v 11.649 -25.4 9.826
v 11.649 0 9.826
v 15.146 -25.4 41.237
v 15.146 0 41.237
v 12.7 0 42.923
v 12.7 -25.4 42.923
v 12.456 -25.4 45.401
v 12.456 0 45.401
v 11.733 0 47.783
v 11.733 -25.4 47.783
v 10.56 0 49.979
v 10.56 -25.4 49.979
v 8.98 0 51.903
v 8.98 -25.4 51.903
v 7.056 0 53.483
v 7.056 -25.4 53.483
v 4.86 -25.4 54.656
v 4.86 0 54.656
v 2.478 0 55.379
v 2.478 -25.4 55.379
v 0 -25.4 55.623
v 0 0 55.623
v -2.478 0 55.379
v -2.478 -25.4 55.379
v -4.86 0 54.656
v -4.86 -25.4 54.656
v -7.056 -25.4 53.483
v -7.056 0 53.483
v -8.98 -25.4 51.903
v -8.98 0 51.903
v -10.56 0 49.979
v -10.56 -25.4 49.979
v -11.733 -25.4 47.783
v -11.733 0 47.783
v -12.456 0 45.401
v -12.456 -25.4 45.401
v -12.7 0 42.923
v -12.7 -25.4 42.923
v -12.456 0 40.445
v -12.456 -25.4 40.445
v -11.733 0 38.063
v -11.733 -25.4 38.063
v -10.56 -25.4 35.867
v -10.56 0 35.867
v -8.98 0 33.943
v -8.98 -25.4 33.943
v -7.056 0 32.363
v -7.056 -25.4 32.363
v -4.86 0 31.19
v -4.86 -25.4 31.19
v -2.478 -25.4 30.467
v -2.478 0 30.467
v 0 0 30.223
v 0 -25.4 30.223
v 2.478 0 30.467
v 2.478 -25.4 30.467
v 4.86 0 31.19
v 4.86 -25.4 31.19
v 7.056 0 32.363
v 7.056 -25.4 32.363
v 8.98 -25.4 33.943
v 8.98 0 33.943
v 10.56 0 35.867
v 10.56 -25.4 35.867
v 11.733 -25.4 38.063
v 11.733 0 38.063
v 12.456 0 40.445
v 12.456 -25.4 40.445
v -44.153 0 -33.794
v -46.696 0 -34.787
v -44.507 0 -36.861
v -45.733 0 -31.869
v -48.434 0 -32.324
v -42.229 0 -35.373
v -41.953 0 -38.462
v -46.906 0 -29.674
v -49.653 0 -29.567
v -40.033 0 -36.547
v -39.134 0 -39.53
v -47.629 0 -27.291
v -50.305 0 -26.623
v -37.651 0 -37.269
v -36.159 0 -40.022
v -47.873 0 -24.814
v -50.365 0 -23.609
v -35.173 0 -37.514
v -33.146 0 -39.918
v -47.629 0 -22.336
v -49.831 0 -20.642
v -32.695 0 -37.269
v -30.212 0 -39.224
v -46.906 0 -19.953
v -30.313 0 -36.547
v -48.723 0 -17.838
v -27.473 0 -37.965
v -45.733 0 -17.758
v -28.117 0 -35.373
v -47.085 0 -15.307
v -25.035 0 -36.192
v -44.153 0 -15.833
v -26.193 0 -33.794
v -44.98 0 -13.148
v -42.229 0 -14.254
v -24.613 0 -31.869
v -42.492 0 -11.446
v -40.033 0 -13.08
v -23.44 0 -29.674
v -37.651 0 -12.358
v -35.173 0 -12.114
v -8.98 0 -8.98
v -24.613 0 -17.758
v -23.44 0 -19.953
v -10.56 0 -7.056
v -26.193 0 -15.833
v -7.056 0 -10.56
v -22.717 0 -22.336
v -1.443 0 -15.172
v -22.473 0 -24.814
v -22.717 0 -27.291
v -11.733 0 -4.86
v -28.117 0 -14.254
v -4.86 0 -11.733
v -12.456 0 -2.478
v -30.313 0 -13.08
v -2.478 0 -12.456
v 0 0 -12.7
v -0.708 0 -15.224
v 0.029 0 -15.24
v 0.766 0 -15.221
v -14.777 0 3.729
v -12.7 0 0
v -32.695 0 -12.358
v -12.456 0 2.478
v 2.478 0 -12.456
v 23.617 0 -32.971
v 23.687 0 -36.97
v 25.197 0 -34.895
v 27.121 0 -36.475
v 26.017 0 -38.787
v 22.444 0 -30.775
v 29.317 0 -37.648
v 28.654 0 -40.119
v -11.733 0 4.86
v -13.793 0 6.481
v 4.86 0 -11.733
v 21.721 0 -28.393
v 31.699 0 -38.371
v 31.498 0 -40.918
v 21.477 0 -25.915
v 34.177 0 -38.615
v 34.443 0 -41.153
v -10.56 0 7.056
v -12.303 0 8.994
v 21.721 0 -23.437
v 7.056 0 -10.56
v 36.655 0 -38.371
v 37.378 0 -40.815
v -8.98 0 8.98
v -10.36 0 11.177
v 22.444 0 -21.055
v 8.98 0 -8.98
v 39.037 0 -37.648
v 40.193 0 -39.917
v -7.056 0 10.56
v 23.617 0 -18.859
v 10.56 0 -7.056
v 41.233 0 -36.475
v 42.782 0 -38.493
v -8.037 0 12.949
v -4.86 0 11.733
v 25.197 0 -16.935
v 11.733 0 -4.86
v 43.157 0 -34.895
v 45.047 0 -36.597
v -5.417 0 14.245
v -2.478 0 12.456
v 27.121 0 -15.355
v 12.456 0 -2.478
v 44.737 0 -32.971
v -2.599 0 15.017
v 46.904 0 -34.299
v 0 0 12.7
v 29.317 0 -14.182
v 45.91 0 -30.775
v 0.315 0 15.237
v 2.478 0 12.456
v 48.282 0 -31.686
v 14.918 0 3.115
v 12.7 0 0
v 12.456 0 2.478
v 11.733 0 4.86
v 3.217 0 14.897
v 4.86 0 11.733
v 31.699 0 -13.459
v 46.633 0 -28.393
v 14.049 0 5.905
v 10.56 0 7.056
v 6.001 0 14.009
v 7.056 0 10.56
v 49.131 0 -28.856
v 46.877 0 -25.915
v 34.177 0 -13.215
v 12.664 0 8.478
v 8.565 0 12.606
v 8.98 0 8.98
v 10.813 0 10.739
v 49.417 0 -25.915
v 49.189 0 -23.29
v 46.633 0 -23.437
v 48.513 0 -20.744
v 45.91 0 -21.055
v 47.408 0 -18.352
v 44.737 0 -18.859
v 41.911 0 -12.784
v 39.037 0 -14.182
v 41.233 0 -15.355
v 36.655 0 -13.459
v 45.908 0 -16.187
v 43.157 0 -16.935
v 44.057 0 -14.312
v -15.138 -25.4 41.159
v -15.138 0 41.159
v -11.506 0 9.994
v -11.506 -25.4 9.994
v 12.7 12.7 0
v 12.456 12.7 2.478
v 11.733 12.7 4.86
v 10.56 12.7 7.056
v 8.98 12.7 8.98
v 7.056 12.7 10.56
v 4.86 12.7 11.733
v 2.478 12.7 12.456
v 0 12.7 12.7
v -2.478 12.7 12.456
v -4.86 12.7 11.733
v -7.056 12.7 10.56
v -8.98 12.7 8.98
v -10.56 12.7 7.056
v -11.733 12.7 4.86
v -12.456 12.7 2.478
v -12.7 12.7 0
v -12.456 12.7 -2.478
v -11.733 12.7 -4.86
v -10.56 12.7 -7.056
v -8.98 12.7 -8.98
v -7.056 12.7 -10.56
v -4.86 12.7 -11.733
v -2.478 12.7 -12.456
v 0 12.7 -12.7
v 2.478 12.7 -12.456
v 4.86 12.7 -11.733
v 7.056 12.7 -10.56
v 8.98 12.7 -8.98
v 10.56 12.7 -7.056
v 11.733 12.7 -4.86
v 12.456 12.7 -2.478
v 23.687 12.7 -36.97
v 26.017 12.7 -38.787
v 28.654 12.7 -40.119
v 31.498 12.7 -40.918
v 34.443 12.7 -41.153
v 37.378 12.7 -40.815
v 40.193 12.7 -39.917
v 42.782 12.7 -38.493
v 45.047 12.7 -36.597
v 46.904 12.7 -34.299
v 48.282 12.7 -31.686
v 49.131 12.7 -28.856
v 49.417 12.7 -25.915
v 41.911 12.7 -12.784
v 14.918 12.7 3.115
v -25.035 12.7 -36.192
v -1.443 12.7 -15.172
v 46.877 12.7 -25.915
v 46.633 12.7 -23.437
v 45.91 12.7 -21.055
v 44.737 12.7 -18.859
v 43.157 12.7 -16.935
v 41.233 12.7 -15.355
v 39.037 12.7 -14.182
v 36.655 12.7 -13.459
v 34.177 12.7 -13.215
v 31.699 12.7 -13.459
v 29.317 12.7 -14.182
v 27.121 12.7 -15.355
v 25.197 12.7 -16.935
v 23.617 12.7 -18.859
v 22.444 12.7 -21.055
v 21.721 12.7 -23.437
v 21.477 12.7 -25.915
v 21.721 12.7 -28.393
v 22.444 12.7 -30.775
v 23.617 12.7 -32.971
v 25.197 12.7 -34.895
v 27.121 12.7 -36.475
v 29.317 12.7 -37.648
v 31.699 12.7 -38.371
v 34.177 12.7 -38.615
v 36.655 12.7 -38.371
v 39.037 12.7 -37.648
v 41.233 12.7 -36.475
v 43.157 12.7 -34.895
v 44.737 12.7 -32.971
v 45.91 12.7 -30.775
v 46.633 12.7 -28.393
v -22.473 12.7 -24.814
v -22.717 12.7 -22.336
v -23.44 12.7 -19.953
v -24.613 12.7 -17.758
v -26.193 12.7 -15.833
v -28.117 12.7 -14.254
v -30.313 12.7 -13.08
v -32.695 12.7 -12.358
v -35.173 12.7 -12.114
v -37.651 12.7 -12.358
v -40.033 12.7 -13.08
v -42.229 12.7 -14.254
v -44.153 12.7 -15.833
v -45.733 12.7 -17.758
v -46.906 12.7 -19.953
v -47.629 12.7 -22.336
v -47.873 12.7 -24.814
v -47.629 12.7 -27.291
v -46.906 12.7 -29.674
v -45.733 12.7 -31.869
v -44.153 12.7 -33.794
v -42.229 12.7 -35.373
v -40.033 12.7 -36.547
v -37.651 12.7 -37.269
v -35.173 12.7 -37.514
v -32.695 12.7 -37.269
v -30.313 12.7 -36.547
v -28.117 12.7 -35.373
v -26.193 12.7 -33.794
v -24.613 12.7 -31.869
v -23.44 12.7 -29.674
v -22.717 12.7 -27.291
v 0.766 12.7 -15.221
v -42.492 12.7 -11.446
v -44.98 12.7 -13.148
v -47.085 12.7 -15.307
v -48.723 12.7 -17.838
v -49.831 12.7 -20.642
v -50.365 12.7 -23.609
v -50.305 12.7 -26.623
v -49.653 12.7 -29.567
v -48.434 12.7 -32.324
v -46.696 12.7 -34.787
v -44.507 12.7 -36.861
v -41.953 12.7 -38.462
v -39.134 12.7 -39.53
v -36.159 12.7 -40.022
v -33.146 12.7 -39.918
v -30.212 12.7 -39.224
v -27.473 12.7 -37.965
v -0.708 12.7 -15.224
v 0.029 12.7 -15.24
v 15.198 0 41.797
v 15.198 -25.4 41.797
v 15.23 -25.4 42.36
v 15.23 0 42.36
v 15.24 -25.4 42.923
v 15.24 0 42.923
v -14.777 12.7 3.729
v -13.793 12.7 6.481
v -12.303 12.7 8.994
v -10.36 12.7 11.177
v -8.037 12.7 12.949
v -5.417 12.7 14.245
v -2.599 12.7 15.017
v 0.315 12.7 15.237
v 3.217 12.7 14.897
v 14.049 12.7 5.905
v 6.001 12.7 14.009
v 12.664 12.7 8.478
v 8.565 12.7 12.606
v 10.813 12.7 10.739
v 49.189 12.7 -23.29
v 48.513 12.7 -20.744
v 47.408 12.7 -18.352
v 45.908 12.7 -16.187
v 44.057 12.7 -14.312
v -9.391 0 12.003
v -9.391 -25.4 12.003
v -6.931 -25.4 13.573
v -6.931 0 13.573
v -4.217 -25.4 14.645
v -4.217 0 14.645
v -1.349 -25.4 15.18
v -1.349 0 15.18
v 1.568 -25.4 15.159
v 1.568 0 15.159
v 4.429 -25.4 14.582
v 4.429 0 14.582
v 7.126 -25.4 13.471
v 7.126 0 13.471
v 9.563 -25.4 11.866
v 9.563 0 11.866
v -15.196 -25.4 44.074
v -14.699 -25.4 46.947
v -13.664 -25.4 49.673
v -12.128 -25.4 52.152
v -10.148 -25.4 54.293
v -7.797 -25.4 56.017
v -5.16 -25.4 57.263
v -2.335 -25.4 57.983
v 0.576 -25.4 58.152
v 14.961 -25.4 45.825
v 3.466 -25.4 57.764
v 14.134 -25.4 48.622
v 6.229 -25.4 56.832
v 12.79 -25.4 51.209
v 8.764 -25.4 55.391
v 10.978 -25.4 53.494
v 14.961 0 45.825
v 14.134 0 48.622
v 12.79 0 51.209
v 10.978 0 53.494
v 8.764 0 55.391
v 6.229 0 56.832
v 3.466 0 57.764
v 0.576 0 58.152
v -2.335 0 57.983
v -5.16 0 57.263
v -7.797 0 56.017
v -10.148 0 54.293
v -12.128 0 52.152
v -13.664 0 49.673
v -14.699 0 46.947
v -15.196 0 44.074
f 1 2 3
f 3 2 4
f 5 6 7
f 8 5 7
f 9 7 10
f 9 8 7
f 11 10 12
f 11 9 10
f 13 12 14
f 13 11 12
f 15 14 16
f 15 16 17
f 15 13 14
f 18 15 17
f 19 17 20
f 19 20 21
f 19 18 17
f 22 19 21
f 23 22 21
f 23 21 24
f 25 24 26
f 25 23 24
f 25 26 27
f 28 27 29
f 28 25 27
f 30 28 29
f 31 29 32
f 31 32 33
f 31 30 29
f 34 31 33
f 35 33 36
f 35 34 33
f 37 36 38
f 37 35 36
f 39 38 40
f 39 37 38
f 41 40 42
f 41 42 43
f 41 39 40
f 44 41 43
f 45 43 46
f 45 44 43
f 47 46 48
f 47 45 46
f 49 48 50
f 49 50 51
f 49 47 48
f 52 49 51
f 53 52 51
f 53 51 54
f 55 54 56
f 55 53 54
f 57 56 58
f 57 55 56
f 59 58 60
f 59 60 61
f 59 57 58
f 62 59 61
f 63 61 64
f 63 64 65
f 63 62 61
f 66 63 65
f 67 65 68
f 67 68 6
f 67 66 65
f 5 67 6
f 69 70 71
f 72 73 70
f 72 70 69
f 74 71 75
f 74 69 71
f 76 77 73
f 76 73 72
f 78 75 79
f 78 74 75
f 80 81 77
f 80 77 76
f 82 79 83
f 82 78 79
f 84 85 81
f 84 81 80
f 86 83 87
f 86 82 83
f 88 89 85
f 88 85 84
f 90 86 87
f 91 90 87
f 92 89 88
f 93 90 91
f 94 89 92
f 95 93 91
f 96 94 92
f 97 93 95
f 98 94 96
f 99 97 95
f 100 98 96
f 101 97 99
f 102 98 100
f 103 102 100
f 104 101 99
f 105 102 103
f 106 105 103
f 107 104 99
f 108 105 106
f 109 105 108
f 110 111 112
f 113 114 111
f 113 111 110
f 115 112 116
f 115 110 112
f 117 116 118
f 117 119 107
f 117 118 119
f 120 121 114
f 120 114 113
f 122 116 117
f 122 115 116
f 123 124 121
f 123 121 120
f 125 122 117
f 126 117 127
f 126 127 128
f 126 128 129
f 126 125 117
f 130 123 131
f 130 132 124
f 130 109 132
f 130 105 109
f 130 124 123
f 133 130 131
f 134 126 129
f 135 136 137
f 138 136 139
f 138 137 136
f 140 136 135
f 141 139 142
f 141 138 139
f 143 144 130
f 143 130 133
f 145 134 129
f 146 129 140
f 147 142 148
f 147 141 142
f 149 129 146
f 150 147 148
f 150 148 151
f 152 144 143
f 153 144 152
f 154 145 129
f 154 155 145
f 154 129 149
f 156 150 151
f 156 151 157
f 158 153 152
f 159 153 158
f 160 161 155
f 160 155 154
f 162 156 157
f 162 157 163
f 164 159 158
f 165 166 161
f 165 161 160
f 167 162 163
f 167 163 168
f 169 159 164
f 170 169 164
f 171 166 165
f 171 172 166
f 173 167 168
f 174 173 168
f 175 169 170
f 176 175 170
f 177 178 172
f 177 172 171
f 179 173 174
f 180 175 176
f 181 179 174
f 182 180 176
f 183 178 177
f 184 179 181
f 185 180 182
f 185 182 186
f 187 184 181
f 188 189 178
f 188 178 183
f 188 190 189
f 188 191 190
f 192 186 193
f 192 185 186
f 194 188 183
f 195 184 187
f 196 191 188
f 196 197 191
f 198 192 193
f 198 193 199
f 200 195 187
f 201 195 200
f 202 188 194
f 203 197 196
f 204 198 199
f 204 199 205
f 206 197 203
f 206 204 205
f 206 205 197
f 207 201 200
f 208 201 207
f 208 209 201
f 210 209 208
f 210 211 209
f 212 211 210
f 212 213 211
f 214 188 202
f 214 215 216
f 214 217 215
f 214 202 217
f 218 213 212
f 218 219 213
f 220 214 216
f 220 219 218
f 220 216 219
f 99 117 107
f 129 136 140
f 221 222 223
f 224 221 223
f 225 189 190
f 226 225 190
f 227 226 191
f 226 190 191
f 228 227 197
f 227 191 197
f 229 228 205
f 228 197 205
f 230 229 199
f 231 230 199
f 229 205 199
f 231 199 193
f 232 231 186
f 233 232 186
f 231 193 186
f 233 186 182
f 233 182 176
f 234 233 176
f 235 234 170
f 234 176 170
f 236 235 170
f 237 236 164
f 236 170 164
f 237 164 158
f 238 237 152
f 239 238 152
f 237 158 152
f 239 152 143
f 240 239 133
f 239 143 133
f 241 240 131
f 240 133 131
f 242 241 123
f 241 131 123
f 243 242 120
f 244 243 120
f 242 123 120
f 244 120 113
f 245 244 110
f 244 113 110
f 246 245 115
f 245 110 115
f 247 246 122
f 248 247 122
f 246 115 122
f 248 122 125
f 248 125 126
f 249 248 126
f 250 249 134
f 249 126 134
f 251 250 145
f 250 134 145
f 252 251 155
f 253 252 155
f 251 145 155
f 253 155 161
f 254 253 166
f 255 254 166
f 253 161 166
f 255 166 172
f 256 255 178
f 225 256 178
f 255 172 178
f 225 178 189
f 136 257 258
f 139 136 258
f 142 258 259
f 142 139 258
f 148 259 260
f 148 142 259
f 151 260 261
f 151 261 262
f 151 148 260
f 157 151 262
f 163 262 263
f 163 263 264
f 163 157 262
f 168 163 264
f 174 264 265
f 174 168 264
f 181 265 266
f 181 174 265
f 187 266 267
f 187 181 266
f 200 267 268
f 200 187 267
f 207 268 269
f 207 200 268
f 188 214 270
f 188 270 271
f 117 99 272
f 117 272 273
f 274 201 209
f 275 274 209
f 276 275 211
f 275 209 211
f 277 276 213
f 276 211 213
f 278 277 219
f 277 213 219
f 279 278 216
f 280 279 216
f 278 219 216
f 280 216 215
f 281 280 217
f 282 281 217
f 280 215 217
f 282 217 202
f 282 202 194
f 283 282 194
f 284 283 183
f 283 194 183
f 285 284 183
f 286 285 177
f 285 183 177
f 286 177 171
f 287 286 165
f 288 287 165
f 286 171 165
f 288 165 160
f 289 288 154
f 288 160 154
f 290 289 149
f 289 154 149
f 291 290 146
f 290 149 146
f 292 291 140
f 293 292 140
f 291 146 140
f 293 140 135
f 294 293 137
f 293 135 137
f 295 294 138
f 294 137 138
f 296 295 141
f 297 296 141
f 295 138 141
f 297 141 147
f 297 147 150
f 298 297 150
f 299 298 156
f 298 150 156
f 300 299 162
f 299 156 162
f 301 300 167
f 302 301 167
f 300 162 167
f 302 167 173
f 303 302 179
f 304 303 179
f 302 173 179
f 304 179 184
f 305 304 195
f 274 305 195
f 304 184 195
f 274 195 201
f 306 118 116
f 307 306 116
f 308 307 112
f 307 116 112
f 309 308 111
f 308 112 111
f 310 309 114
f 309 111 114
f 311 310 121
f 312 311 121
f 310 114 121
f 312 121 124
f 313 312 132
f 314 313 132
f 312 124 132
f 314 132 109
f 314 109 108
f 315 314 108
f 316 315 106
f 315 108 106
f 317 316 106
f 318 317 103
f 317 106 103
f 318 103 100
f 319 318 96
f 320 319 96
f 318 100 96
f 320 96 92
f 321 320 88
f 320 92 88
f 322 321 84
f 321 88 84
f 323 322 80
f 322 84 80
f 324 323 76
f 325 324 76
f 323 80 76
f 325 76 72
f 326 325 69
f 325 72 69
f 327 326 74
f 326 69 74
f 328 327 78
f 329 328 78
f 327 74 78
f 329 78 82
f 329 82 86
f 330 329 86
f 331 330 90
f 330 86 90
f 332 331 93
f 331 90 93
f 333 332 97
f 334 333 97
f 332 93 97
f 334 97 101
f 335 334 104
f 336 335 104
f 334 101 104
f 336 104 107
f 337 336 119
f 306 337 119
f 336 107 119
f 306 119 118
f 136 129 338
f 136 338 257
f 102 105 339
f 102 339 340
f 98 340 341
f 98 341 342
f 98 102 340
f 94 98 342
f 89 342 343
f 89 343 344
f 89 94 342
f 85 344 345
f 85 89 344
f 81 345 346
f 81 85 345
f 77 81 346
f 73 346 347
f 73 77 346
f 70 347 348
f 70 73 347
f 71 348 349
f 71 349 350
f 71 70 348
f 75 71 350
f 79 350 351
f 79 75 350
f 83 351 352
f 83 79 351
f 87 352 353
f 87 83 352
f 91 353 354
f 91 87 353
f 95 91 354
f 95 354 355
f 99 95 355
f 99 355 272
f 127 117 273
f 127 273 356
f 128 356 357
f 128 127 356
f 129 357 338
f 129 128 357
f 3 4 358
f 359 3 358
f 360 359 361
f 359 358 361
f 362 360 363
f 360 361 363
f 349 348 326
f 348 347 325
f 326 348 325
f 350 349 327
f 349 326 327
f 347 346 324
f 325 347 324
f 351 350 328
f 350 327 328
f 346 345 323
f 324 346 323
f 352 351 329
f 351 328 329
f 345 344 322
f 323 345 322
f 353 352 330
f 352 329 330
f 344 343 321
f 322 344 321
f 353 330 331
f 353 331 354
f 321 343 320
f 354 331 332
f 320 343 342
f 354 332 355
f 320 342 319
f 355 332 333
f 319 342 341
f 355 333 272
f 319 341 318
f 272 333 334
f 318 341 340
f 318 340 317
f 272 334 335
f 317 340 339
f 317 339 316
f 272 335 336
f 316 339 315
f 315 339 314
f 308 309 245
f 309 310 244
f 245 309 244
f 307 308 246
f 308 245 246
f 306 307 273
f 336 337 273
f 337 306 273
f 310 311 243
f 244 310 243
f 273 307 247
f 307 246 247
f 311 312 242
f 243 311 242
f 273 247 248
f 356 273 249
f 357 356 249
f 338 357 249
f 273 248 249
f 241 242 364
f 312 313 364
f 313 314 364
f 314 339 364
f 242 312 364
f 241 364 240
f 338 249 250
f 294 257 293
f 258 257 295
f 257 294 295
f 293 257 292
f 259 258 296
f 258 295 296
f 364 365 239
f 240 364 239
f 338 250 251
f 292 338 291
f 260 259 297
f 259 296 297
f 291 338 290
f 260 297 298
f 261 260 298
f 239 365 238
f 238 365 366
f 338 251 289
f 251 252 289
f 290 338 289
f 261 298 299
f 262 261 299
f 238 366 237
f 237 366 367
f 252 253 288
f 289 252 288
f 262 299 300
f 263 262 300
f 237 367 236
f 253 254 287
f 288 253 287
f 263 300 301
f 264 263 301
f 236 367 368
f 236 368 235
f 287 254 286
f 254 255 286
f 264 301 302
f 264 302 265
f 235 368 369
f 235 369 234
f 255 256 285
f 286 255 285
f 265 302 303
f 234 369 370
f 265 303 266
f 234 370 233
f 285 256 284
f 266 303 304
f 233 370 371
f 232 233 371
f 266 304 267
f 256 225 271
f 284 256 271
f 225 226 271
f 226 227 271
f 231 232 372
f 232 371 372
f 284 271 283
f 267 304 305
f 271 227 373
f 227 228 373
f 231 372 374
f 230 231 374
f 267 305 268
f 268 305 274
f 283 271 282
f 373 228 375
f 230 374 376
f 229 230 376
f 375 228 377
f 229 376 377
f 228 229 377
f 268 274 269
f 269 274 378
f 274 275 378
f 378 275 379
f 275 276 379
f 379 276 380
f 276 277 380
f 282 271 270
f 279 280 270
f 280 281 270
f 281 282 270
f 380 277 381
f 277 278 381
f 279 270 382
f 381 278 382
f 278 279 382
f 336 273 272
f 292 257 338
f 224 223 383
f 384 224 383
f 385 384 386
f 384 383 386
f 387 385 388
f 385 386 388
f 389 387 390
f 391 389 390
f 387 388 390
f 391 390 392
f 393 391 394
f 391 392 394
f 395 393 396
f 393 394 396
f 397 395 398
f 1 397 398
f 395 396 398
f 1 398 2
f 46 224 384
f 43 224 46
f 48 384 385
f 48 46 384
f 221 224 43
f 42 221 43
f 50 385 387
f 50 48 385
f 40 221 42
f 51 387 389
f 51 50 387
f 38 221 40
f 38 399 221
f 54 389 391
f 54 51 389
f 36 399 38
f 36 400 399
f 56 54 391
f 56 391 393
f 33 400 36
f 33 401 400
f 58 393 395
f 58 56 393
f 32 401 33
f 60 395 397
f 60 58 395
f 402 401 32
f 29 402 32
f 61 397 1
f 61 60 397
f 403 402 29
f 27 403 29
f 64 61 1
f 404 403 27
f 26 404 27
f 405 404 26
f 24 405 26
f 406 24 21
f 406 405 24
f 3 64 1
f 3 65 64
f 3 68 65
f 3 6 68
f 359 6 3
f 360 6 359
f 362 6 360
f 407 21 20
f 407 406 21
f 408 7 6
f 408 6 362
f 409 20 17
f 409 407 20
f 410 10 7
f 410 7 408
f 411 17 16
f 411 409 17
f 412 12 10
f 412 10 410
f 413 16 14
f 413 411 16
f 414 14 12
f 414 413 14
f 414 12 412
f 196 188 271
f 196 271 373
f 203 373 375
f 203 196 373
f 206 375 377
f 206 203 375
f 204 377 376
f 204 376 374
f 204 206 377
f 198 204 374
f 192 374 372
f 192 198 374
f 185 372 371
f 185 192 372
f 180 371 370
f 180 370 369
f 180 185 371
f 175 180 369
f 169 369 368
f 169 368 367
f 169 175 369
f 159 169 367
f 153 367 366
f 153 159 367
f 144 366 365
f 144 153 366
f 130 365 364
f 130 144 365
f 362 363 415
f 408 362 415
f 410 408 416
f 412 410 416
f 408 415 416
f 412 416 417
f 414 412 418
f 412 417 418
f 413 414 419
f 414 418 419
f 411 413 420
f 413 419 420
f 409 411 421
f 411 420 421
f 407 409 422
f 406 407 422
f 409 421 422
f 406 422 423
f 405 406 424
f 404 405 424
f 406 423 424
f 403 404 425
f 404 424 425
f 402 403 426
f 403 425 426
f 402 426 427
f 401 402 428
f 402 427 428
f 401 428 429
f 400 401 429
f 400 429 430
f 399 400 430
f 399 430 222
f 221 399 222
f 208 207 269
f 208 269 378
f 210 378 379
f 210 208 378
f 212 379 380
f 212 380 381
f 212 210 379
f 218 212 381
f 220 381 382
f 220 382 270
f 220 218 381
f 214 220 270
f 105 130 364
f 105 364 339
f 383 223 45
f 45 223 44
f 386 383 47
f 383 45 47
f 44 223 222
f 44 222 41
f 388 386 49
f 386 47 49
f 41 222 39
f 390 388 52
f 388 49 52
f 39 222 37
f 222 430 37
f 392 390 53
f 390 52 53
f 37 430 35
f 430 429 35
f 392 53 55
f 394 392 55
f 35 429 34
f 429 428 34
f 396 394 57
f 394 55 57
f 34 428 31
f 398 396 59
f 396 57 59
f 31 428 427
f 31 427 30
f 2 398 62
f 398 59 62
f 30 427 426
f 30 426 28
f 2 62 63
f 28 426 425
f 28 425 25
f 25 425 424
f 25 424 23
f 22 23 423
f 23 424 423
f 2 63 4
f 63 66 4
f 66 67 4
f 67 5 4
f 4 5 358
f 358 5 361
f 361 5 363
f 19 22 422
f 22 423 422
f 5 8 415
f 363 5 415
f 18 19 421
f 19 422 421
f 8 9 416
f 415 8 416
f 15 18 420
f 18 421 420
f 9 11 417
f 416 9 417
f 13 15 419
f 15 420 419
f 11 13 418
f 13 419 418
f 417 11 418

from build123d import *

# Parameters (mm, degrees)
F0_R     = 15.24
F0_R_2   = 12.7
F1_DEPTH = 12.7
F2_R     = 12.7
F3_DEPTH = 25.4
F4_R     = 12.7
F5_DEPTH = 12.7


with BuildPart() as f1:
    # F0 (on Front) → F1 (new body)
    with BuildSketch(Plane.XZ):
        Circle(F0_R)
        Circle(F0_R_2, mode=Mode.SUBTRACT)
    extrude(amount=-F1_DEPTH)

    # F4 (on Front) → F5 (join)
    with BuildSketch(Plane.XZ):
        with BuildLine():
            ThreePointArc((-1.4432226111, -15.1715097632), (-12.4530081547, -8.7852255463), (-14.7768029338, 3.7287658889))
            Line((-14.7768029338, 3.7287658889), (-42.4920327472, -11.4460277555))
            ThreePointArc((-42.4920327472, -11.4460277555), (-27.4039738732, -11.7024445415), (-19.9330004429, -24.813501942))
            ThreePointArc((-19.9330004429, -24.813501942), (-21.266744036, -31.048374254), (-25.0345270501, -36.1919445975))
            Line((-25.0345270501, -36.1919445975), (-1.4432226111, -15.1715097632))
        make_face()
        with BuildLine():
            ThreePointArc((-19.9330004429, -24.813501942), (-27.4039738732, -11.7024445415), (-42.4920327472, -11.4460277555))
            ThreePointArc((-42.4920327472, -11.4460277555), (-47.6260085976, -33.5987274883), (-25.0345270501, -36.1919445975))
            ThreePointArc((-25.0345270501, -36.1919445975), (-21.266744036, -31.048374254), (-19.9330004429, -24.813501942))
        make_face()
        with Locations((-35.1730004429, -24.813501942)):
            Circle(F4_R, mode=Mode.SUBTRACT)
        with BuildLine():
            ThreePointArc((23.6868947427, -36.9702032486), (22.005429254, -16.7439020463), (41.9113655759, -12.7835629617))
            Line((41.9113655759, -12.7835629617), (14.9182126054, 3.11520989))
            ThreePointArc((14.9182126054, 3.11520989), (15.1593396971, 1.5658926996), (15.24, 0))
            ThreePointArc((15.24, 0), (11.0437961568, -10.5020077341), (0.7659624086, -15.2207391932))
            Line((0.7659624086, -15.2207391932), (23.6868947427, -36.9702032486))
        make_face()
        with BuildLine():
            ThreePointArc((23.6868947427, -36.9702032486), (40.1931577089, -39.9173526309), (49.4169899462, -25.9150911903))
            ThreePointArc((49.4169899462, -25.9150911903), (47.4081933041, -18.3524952272), (41.9113655759, -12.7835629617))
            ThreePointArc((41.9113655759, -12.7835629617), (22.005429254, -16.7439020463), (23.6868947427, -36.9702032486))
        make_face()
        with Locations((34.1769899462, -25.9150911903)):
            Circle(F4_R, mode=Mode.SUBTRACT)
    extrude(amount=-F5_DEPTH)


with BuildPart() as f3:
    # F2 (on Front) → F3 (new body)
    with BuildSketch(Plane.XZ):
        with BuildLine():
            ThreePointArc((15.1464025023, 41.2365004611), (0.0390187723, 27.6829937802), (-15.1375684015, 41.1589645532))
            Line((-15.1375684015, 41.1589645532), (-11.5058741435, 9.9936209751))
            ThreePointArc((-11.5058741435, 9.9936209751), (0.1101276854, 15.239602091), (11.649101066, 9.8262935206))
            Line((11.649101066, 9.8262935206), (15.1464025023, 41.2365004611))
        make_face()
        with BuildLine():
            ThreePointArc((15.1464025023, 41.2365004611), (15.2165826343, 42.0784244805), (15.24, 42.9229438305))
            ThreePointArc((15.24, 42.9229438305), (-0.8834753991, 58.13731438), (-15.1375684015, 41.1589645532))
            ThreePointArc((-15.1375684015, 41.1589645532), (0.0390187723, 27.6829937802), (15.1464025023, 41.2365004611))
        make_face()
        with Locations((0, 42.9229438305)):
            Circle(F2_R, mode=Mode.SUBTRACT)
    extrude(amount=F3_DEPTH)


solid = Compound([f1.part, f3.part])
